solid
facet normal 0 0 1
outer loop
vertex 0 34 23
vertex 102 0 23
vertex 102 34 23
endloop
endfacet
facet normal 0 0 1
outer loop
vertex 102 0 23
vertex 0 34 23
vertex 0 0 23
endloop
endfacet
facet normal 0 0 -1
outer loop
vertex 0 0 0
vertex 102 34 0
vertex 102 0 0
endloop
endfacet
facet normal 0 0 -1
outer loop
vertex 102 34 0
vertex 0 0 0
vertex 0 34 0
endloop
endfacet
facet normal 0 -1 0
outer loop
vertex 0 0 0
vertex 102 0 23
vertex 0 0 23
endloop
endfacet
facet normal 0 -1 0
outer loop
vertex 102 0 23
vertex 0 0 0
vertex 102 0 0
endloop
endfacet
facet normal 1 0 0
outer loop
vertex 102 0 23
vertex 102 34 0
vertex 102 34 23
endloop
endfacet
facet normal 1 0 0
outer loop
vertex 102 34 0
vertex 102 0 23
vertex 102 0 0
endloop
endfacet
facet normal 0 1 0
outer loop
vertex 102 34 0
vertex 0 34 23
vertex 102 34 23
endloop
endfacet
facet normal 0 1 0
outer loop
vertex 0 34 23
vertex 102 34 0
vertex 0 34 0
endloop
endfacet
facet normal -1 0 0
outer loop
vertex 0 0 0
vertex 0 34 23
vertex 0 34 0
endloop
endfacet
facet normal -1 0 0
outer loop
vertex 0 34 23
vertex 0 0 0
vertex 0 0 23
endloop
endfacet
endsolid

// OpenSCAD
// =====================================================================
// lipo_3s_2200_zeee.scad — Zeee 3S 11.1V 2200mAh 50C (実購入品の簡易モデル)
//
// 購入品だがベンダの 3D データが無いため、公称寸法から自作した確認用モデル。
// 印刷対象ではない (アセンブリの干渉確認とベイ寸法決定に使う)。
//
// 出典: docs/未踏ジュニア購入物品.xlsx (2026-07-22 購入 / Amazon B07QKR6DRL,
//       2本入りで親機・子機に1本ずつ)。寸法 102 x 34 x 23mm ±2mm / 約170g。
//       放電コネクタ = T(ディーンズ)プラグ + XT60 変換ケーブル同梱、
//       バランスコネクタ = JST-XH 4P。
//
// 原点: 左手前下の角 (0,0,0)。X=長さ102 / Y=幅34 / Z=高さ23。
//       リード線は +X 端面から出る。
//
// バリアント (variants.txt):
//   pack … セル本体のみ。ベイ内寸を決めるのはこちら
//   env  … 本体 + リード/コネクタ余裕ゾーン。配線スペースの確保確認用
//
// Fusion編集用に cube のみ (角丸は付けない — CLAUDE.md 規約)。
// =====================================================================

/* [セル本体 (公称)] */
cell_l    = 102;   // 長さ (X)
cell_w    = 34;    // 幅   (Y)
cell_h    = 23;    // 高さ (Z)
tol       = 0;     // 公称に対する製造ばらつき (データシート ±2mm)。
                   // ベイ側で吸収するのでモデルは 0 のまま使う

/* [リード/コネクタ余裕ゾーン] */
show_leads  = false;  // true でリード側の余裕ゾーンを付ける (env バリアント)
lead_zone_l = 40;     // +X 端面から必要な長さ (曲げ + プラグ + 抜き差し)
lead_zone_w = 26;     // 幅 (放電2本 + バランス1本を束ねた帯)
lead_zone_h = 16;     // 高さ

$fn = 32;

// ---- 導出 -----------------------------------------------------------
bl = cell_l + tol;
bw = cell_w + tol;
bh = cell_h + tol;
lz_y0 = (bw - lead_zone_w) / 2;   // 余裕ゾーンを幅方向で中央に
lz_z0 = (bh - lead_zone_h) / 2;   // 同じく高さ方向で中央に

// ---- 成立性チェック --------------------------------------------------
// 余裕ゾーンはセル端面からはみ出さないこと (はみ出すとゾーンが宙に浮く)
assert(lead_zone_w <= bw + 0.01,
       str("リード余裕ゾーン幅 ", lead_zone_w, " がセル幅 ", bw, " を超過"));
assert(lead_zone_h <= bh + 0.01,
       str("リード余裕ゾーン高さ ", lead_zone_h, " がセル高さ ", bh, " を超過"));
// 3S パックとして辻褄が合う体積か (セル3本ぶん = 概ね 60cm^3 以上)
assert(bl * bw * bh > 60000,
       "セル外形が 3S 2200mAh として小さすぎる — 寸法の取り違えを疑うこと");

// ---- 本体 -------------------------------------------------------------
union() {
    // セル本体 (熱収縮チューブ外形)
    cube([bl, bw, bh]);

    // リード線 + プラグの占有ゾーン (干渉確認用)
    if (show_leads)
        translate([bl, lz_y0, lz_z0])
            cube([lead_zone_l, lead_zone_w, lead_zone_h]);
}

echo(str("lipo_3s_2200_zeee: ", bl, " x ", bw, " x ", bh,
         show_leads ? str("  +リードゾーン ", lead_zone_l) : "",
         "  全長 ", bl + (show_leads ? lead_zone_l : 0)));
